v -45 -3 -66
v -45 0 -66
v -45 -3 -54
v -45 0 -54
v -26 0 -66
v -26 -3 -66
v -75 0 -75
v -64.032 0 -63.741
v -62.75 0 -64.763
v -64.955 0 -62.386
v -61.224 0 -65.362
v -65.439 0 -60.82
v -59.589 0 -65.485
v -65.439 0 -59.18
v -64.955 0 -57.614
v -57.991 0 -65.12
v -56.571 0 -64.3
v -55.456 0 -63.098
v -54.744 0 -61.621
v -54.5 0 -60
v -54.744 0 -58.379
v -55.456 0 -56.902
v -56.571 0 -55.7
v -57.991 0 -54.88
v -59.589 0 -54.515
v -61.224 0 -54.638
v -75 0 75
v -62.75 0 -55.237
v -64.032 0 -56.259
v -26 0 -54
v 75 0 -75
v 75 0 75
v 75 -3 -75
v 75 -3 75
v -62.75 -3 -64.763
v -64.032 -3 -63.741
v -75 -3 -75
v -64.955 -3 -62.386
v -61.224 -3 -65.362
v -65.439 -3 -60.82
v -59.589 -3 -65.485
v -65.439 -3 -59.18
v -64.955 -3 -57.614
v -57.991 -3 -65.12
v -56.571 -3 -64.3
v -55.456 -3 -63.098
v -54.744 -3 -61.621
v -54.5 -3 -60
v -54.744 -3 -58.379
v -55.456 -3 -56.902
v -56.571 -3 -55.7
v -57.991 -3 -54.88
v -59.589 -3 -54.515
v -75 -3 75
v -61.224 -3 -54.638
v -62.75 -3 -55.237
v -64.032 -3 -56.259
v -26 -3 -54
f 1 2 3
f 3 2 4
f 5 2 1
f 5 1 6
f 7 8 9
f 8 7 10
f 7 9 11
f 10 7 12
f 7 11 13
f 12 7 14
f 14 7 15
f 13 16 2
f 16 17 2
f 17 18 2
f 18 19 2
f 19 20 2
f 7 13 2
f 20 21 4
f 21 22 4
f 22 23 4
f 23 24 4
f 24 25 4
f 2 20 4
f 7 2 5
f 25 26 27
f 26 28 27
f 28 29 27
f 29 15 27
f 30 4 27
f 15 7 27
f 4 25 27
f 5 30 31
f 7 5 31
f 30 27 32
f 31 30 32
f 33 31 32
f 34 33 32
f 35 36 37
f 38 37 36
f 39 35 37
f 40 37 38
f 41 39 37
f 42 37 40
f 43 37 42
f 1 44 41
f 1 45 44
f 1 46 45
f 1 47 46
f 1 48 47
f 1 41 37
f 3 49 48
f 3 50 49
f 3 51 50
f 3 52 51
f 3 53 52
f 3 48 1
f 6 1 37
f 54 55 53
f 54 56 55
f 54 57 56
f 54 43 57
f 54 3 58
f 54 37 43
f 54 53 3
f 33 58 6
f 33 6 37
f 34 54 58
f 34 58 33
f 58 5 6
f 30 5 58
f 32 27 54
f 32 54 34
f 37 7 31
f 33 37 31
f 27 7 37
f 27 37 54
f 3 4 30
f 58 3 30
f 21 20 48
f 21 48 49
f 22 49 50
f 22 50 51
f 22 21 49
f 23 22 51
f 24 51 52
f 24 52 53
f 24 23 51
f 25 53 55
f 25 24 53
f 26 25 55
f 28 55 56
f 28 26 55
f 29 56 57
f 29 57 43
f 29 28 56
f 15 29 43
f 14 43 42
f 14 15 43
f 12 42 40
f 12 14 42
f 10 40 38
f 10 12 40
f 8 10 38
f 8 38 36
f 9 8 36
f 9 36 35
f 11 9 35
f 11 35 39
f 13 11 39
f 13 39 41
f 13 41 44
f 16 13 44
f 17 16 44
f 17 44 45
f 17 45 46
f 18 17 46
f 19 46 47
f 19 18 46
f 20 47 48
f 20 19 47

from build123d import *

# Parameters (mm, degrees)
F0_W     = 150
F0_H     = 150
F0_R     = 5.5
F0_W_2   = 19
F0_H_2   = 12
F1_DEPTH = 3


with BuildPart() as f1:
    # F0 (on Front) → F1 (new body)
    with BuildSketch(Plane.XZ):
        Rectangle(F0_W, F0_H)
        with Locations((-60, -60)):
            Circle(F0_R, mode=Mode.SUBTRACT)
        with Locations((-35.5, -60)):
            Rectangle(F0_W_2, F0_H_2, mode=Mode.SUBTRACT)
    extrude(amount=F1_DEPTH)


solid = f1.part
